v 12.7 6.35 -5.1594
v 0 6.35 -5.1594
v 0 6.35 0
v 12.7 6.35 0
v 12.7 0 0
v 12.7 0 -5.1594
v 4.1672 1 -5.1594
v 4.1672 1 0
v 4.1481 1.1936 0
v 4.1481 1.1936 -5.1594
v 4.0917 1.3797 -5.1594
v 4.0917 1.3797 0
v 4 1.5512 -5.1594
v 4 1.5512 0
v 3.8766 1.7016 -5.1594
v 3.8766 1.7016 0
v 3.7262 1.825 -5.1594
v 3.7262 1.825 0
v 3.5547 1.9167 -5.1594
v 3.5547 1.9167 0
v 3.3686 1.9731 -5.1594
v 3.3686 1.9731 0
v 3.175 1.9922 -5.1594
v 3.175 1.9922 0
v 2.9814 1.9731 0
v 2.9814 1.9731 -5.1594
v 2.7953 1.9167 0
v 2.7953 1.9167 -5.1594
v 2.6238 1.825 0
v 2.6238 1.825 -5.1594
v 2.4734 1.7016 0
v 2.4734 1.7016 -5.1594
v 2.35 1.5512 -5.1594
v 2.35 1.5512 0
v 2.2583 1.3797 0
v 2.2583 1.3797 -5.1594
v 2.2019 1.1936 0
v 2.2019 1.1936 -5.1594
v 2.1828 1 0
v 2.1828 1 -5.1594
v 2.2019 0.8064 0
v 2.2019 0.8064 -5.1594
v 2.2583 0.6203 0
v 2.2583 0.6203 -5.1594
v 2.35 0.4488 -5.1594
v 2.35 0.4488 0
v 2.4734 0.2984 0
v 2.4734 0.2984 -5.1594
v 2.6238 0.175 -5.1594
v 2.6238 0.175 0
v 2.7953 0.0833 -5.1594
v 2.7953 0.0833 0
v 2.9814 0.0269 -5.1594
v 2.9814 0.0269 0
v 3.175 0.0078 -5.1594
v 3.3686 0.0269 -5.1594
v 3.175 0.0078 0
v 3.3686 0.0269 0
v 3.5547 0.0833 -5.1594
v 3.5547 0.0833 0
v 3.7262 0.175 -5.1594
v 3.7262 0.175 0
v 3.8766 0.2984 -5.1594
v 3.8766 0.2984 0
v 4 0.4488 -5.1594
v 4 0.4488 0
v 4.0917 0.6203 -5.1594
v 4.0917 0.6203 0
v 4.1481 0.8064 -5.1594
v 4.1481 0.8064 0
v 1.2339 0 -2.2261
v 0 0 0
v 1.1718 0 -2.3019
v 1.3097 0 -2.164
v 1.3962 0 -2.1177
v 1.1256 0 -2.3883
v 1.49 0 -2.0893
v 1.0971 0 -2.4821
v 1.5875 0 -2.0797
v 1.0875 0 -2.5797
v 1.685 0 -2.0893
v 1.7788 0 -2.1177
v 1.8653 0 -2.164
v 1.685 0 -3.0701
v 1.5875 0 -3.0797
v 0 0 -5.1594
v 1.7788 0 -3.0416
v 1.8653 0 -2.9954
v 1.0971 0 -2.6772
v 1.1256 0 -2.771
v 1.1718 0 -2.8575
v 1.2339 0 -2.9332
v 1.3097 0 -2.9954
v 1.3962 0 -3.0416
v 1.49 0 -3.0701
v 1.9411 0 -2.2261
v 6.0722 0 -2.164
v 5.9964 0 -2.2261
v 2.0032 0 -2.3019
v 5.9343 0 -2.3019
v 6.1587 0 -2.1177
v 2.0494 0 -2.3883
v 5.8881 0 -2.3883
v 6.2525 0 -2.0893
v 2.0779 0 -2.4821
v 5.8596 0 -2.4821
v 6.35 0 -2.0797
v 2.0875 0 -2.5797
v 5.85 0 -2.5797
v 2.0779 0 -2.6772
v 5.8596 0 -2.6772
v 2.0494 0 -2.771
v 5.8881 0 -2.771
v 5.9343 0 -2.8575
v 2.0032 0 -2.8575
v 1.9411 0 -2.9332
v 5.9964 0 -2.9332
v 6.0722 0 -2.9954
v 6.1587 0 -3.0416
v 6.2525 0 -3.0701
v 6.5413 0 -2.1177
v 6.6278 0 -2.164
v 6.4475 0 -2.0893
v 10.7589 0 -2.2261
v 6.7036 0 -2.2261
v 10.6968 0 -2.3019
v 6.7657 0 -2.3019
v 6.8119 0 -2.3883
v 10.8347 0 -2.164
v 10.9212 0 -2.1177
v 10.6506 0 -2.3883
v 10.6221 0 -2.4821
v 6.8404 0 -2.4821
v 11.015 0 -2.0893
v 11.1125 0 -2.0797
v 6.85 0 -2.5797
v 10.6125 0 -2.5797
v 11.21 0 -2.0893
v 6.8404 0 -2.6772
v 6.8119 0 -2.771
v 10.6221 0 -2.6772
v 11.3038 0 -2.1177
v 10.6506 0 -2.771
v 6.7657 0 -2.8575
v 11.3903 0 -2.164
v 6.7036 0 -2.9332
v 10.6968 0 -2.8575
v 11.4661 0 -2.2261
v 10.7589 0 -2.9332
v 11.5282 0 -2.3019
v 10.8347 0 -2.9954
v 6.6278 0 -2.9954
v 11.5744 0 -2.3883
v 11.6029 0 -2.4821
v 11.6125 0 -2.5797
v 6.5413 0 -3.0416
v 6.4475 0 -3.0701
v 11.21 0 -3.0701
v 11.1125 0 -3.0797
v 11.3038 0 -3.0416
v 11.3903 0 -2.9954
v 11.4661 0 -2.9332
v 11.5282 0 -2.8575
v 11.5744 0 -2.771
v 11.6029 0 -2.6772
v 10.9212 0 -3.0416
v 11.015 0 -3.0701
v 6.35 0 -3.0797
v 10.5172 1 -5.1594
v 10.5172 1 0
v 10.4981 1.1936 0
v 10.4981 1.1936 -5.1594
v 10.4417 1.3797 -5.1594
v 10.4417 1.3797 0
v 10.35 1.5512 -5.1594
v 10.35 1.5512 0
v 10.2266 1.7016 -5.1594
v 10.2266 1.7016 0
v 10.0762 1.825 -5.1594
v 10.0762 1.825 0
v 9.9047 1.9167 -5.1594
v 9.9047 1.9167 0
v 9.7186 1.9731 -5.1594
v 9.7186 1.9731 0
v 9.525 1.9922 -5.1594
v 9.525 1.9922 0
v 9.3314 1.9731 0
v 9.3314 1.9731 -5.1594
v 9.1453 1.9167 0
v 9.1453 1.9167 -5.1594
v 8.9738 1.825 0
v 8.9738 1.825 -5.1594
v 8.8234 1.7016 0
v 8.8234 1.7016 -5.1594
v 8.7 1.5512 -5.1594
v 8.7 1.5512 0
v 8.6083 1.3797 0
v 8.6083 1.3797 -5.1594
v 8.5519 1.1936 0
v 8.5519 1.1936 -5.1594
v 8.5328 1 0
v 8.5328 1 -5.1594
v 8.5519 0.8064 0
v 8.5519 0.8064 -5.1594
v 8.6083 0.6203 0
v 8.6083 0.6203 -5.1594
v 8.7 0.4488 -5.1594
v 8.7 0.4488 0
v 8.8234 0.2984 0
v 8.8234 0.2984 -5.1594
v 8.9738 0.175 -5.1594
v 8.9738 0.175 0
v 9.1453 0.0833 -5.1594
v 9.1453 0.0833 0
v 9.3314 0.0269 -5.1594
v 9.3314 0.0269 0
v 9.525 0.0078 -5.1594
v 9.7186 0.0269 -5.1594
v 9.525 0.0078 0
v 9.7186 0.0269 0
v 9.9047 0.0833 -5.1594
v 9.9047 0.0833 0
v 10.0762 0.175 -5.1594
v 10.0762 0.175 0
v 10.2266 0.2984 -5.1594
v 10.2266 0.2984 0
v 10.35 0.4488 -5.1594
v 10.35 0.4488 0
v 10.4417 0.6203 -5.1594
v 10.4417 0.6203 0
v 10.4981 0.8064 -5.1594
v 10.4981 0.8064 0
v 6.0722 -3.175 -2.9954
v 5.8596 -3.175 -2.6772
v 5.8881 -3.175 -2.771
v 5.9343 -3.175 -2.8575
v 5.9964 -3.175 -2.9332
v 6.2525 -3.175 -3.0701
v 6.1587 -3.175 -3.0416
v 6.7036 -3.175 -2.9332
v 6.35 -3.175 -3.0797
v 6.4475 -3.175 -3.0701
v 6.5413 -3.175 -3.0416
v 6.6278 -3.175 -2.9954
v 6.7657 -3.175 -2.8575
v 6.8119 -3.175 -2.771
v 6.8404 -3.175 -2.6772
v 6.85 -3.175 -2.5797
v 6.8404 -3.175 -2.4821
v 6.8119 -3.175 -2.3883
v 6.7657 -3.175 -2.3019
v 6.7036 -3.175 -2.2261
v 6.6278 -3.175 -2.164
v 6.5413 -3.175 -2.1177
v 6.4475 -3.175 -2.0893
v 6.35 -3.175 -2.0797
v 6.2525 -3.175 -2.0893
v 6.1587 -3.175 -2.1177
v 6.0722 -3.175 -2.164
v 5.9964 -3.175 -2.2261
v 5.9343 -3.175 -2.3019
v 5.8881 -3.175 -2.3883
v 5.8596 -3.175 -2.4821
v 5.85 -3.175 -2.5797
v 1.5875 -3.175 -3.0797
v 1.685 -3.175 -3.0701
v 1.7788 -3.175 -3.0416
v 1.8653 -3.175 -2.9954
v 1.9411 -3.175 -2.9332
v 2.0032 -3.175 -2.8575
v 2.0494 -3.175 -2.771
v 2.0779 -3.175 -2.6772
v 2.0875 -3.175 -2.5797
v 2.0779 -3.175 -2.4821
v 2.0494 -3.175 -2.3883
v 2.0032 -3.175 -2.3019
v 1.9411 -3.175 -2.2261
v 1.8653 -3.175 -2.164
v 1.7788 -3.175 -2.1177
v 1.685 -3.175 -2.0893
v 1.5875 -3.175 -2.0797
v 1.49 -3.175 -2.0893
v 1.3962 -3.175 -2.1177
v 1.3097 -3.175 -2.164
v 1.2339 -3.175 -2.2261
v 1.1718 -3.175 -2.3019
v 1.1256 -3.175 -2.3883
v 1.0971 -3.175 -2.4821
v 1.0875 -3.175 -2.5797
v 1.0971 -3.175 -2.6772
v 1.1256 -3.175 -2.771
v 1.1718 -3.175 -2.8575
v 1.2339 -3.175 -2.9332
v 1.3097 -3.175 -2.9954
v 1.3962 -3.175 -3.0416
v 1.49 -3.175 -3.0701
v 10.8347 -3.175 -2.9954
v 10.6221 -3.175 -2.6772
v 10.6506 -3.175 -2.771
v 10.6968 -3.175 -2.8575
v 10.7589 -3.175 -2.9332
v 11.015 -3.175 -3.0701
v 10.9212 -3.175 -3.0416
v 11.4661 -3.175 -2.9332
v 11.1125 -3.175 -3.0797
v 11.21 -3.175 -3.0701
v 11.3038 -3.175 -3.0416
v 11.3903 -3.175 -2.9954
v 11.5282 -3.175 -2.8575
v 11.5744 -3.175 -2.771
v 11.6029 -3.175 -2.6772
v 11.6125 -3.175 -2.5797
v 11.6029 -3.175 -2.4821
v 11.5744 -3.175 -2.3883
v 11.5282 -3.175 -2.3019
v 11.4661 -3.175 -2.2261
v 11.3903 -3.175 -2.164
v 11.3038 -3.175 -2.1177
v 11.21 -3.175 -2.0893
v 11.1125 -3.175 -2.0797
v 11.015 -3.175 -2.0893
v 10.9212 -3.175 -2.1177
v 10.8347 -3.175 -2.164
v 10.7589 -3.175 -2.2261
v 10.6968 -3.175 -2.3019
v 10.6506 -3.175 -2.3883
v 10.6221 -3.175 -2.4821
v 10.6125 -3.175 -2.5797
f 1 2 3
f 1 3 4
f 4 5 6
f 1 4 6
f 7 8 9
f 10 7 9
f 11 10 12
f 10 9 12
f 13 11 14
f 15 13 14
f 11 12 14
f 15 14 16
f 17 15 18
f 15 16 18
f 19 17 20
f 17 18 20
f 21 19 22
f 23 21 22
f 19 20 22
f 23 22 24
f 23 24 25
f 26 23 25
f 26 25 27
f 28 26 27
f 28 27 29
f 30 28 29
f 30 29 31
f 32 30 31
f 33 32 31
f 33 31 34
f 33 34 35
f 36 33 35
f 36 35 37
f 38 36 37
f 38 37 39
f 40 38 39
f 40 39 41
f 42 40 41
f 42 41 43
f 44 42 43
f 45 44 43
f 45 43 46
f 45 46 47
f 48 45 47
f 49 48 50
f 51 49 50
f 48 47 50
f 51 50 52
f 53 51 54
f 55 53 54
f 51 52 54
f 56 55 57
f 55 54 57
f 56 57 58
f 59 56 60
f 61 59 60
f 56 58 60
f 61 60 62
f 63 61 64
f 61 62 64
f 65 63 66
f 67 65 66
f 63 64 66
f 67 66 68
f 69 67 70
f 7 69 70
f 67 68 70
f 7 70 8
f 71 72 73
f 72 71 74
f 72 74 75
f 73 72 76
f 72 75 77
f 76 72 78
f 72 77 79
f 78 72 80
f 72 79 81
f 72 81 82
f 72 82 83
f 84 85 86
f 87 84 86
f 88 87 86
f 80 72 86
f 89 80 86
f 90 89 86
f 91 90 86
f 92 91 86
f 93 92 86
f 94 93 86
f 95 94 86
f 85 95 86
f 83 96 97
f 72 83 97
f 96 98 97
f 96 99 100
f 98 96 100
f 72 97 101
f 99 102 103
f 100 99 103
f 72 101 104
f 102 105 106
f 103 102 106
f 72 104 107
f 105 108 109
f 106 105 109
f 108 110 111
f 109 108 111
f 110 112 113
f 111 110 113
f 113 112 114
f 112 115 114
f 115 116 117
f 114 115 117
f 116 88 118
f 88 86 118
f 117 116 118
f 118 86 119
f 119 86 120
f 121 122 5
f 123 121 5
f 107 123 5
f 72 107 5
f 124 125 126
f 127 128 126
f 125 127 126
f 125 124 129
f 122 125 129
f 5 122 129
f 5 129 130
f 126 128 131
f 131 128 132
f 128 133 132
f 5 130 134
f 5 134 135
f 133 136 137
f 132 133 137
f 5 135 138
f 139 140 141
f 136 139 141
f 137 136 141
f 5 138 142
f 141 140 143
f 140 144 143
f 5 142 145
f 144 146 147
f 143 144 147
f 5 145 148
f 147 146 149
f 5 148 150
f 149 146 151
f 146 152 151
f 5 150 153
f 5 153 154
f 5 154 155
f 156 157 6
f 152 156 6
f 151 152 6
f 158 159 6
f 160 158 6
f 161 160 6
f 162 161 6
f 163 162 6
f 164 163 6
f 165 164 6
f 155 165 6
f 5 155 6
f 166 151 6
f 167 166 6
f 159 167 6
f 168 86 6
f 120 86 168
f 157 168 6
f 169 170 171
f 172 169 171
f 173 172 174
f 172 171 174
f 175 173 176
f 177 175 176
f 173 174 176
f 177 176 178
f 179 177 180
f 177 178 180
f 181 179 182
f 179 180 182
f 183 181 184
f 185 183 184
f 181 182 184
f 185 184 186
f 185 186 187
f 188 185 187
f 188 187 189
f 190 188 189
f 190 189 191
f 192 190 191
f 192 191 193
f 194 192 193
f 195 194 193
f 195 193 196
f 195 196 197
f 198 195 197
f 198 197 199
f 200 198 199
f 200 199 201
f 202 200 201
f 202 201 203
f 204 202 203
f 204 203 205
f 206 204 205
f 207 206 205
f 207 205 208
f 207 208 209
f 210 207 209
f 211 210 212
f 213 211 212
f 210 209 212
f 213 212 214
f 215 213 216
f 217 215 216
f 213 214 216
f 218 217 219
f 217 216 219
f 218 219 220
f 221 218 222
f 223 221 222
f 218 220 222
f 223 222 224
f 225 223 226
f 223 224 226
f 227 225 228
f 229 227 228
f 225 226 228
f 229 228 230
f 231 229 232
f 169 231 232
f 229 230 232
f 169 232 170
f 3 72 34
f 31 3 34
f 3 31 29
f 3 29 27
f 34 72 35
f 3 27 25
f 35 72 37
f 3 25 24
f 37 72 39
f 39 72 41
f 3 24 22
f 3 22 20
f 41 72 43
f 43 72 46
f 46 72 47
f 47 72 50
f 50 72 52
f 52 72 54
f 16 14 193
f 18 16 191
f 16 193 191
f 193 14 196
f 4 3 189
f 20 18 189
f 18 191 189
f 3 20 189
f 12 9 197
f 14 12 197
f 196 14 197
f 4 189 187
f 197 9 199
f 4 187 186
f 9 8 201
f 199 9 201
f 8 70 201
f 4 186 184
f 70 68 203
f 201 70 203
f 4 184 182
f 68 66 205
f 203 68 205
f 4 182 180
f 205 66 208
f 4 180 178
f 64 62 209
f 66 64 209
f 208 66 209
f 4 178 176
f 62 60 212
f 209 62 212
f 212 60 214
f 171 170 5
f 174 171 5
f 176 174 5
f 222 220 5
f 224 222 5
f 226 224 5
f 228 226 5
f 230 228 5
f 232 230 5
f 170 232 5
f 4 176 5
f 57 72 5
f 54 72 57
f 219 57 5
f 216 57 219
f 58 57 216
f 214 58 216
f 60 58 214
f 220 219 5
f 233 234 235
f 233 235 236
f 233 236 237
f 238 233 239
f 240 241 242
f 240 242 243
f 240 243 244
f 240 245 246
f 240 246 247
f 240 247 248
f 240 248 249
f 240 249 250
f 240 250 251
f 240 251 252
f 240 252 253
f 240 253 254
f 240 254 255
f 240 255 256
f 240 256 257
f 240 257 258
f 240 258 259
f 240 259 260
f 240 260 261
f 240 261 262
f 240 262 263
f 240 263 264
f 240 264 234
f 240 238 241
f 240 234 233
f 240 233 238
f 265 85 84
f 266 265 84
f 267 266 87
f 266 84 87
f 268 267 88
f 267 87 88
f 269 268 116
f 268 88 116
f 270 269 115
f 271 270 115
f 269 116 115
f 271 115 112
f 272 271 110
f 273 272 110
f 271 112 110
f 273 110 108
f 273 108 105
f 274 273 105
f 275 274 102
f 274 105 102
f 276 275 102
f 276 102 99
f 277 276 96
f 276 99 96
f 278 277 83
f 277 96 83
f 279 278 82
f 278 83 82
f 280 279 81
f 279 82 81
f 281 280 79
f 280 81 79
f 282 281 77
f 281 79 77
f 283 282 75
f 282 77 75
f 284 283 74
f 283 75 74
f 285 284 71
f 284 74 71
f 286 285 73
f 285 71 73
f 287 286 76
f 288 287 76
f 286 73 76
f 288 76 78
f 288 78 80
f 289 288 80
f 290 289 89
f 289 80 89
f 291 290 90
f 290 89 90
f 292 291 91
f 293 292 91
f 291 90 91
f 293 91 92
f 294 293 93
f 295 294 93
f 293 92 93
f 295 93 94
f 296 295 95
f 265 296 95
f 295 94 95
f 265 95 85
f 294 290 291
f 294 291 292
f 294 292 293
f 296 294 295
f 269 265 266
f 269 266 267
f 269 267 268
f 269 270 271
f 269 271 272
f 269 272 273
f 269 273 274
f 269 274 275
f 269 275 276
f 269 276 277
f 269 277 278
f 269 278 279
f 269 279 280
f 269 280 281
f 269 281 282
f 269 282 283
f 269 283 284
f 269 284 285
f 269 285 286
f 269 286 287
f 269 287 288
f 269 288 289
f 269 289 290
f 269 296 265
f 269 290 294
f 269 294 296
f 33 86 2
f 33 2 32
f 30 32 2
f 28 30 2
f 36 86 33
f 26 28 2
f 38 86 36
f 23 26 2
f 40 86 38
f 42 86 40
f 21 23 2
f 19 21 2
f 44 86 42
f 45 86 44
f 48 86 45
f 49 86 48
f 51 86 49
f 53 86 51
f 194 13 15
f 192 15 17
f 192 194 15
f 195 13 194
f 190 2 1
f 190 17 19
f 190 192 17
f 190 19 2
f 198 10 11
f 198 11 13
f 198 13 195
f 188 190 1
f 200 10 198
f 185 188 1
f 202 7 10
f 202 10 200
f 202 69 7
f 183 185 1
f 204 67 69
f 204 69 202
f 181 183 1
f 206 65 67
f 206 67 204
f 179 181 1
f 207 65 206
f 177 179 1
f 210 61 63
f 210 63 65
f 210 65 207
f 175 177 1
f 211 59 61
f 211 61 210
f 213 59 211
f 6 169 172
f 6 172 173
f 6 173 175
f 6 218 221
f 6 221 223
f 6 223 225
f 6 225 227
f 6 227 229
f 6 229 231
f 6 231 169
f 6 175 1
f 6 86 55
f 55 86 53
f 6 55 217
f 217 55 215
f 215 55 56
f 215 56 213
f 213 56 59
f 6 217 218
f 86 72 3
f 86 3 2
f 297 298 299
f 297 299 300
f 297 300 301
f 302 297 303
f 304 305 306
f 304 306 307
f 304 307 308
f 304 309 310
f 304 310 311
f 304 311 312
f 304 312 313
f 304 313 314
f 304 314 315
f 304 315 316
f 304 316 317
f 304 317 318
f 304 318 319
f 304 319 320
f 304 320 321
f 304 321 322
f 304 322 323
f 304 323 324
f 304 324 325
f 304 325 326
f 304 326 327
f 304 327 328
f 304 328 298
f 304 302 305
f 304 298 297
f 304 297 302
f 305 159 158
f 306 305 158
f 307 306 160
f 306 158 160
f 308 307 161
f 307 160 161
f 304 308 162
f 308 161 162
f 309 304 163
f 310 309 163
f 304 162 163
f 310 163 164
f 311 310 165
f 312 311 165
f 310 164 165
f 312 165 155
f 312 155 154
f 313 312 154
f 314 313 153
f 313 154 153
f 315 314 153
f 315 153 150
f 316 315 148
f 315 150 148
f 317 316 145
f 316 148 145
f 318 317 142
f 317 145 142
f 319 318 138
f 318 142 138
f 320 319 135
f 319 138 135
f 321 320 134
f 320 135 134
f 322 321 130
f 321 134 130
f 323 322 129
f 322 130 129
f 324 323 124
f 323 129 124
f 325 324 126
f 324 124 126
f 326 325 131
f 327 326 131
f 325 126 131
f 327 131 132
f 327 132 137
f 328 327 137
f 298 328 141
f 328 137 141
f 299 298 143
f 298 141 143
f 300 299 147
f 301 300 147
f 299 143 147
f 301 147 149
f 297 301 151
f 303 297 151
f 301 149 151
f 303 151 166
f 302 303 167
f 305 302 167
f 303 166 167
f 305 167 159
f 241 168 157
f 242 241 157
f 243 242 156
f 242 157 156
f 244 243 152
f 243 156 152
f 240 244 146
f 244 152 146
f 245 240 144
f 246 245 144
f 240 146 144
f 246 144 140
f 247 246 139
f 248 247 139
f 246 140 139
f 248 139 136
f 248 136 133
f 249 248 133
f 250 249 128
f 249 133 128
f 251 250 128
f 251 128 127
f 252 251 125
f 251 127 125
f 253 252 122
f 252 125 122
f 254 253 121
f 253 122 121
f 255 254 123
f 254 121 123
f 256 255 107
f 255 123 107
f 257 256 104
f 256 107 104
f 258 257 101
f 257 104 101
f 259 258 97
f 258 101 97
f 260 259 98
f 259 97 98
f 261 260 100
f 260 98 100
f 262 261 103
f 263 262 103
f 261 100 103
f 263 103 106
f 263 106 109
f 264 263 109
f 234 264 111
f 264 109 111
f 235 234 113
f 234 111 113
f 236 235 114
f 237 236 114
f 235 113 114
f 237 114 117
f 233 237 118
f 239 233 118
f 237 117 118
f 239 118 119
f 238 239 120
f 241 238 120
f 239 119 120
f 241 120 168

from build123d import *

# Parameters (mm, degrees)
SKETCH1_W           = 12.7
SKETCH1_H           = 5.159375
BOSS_EXTRUDE1_DEPTH = 6.35
SKETCH2_R           = 0.5
BOSS_EXTRUDE2_DEPTH = 3.175
SKETCH3_R           = 0.9921875
CUT_EXTRUDE1_DEPTH  = 16.107337634


with BuildPart() as part:
    # Sketch1 → Boss-Extrude1 (new body)
    with BuildSketch(Plane(origin=(0, 0, 0), x_dir=(1, 0, 0), z_dir=(0, 1, 0))):
        with Locations((6.35, 2.5796875)):
            Rectangle(SKETCH1_W, SKETCH1_H)
    extrude(amount=BOSS_EXTRUDE1_DEPTH)

    # Sketch2 → Boss-Extrude2 (add)
    with BuildSketch(Plane.XZ):
        with Locations(Location((6.35, -2.5796875, 0), (0, 0, 270))):
            Circle(SKETCH2_R)
        with Locations(Location((1.5875, -2.5796875, 0), (0, 0, 270))):
            Circle(SKETCH2_R)
        with Locations(Location((11.1125, -2.5796875, 0), (0, 0, 270))):
            Circle(SKETCH2_R)
    extrude(amount=BOSS_EXTRUDE2_DEPTH)

    # Sketch3 → Cut-Extrude1 (cut, through all)
    with BuildSketch(Plane.XY):
        with Locations((9.525, 1)):
            Circle(SKETCH3_R)
        with Locations((3.175, 1)):
            Circle(SKETCH3_R)
    extrude(amount=-CUT_EXTRUDE1_DEPTH, mode=Mode.SUBTRACT)


solid = part.part
